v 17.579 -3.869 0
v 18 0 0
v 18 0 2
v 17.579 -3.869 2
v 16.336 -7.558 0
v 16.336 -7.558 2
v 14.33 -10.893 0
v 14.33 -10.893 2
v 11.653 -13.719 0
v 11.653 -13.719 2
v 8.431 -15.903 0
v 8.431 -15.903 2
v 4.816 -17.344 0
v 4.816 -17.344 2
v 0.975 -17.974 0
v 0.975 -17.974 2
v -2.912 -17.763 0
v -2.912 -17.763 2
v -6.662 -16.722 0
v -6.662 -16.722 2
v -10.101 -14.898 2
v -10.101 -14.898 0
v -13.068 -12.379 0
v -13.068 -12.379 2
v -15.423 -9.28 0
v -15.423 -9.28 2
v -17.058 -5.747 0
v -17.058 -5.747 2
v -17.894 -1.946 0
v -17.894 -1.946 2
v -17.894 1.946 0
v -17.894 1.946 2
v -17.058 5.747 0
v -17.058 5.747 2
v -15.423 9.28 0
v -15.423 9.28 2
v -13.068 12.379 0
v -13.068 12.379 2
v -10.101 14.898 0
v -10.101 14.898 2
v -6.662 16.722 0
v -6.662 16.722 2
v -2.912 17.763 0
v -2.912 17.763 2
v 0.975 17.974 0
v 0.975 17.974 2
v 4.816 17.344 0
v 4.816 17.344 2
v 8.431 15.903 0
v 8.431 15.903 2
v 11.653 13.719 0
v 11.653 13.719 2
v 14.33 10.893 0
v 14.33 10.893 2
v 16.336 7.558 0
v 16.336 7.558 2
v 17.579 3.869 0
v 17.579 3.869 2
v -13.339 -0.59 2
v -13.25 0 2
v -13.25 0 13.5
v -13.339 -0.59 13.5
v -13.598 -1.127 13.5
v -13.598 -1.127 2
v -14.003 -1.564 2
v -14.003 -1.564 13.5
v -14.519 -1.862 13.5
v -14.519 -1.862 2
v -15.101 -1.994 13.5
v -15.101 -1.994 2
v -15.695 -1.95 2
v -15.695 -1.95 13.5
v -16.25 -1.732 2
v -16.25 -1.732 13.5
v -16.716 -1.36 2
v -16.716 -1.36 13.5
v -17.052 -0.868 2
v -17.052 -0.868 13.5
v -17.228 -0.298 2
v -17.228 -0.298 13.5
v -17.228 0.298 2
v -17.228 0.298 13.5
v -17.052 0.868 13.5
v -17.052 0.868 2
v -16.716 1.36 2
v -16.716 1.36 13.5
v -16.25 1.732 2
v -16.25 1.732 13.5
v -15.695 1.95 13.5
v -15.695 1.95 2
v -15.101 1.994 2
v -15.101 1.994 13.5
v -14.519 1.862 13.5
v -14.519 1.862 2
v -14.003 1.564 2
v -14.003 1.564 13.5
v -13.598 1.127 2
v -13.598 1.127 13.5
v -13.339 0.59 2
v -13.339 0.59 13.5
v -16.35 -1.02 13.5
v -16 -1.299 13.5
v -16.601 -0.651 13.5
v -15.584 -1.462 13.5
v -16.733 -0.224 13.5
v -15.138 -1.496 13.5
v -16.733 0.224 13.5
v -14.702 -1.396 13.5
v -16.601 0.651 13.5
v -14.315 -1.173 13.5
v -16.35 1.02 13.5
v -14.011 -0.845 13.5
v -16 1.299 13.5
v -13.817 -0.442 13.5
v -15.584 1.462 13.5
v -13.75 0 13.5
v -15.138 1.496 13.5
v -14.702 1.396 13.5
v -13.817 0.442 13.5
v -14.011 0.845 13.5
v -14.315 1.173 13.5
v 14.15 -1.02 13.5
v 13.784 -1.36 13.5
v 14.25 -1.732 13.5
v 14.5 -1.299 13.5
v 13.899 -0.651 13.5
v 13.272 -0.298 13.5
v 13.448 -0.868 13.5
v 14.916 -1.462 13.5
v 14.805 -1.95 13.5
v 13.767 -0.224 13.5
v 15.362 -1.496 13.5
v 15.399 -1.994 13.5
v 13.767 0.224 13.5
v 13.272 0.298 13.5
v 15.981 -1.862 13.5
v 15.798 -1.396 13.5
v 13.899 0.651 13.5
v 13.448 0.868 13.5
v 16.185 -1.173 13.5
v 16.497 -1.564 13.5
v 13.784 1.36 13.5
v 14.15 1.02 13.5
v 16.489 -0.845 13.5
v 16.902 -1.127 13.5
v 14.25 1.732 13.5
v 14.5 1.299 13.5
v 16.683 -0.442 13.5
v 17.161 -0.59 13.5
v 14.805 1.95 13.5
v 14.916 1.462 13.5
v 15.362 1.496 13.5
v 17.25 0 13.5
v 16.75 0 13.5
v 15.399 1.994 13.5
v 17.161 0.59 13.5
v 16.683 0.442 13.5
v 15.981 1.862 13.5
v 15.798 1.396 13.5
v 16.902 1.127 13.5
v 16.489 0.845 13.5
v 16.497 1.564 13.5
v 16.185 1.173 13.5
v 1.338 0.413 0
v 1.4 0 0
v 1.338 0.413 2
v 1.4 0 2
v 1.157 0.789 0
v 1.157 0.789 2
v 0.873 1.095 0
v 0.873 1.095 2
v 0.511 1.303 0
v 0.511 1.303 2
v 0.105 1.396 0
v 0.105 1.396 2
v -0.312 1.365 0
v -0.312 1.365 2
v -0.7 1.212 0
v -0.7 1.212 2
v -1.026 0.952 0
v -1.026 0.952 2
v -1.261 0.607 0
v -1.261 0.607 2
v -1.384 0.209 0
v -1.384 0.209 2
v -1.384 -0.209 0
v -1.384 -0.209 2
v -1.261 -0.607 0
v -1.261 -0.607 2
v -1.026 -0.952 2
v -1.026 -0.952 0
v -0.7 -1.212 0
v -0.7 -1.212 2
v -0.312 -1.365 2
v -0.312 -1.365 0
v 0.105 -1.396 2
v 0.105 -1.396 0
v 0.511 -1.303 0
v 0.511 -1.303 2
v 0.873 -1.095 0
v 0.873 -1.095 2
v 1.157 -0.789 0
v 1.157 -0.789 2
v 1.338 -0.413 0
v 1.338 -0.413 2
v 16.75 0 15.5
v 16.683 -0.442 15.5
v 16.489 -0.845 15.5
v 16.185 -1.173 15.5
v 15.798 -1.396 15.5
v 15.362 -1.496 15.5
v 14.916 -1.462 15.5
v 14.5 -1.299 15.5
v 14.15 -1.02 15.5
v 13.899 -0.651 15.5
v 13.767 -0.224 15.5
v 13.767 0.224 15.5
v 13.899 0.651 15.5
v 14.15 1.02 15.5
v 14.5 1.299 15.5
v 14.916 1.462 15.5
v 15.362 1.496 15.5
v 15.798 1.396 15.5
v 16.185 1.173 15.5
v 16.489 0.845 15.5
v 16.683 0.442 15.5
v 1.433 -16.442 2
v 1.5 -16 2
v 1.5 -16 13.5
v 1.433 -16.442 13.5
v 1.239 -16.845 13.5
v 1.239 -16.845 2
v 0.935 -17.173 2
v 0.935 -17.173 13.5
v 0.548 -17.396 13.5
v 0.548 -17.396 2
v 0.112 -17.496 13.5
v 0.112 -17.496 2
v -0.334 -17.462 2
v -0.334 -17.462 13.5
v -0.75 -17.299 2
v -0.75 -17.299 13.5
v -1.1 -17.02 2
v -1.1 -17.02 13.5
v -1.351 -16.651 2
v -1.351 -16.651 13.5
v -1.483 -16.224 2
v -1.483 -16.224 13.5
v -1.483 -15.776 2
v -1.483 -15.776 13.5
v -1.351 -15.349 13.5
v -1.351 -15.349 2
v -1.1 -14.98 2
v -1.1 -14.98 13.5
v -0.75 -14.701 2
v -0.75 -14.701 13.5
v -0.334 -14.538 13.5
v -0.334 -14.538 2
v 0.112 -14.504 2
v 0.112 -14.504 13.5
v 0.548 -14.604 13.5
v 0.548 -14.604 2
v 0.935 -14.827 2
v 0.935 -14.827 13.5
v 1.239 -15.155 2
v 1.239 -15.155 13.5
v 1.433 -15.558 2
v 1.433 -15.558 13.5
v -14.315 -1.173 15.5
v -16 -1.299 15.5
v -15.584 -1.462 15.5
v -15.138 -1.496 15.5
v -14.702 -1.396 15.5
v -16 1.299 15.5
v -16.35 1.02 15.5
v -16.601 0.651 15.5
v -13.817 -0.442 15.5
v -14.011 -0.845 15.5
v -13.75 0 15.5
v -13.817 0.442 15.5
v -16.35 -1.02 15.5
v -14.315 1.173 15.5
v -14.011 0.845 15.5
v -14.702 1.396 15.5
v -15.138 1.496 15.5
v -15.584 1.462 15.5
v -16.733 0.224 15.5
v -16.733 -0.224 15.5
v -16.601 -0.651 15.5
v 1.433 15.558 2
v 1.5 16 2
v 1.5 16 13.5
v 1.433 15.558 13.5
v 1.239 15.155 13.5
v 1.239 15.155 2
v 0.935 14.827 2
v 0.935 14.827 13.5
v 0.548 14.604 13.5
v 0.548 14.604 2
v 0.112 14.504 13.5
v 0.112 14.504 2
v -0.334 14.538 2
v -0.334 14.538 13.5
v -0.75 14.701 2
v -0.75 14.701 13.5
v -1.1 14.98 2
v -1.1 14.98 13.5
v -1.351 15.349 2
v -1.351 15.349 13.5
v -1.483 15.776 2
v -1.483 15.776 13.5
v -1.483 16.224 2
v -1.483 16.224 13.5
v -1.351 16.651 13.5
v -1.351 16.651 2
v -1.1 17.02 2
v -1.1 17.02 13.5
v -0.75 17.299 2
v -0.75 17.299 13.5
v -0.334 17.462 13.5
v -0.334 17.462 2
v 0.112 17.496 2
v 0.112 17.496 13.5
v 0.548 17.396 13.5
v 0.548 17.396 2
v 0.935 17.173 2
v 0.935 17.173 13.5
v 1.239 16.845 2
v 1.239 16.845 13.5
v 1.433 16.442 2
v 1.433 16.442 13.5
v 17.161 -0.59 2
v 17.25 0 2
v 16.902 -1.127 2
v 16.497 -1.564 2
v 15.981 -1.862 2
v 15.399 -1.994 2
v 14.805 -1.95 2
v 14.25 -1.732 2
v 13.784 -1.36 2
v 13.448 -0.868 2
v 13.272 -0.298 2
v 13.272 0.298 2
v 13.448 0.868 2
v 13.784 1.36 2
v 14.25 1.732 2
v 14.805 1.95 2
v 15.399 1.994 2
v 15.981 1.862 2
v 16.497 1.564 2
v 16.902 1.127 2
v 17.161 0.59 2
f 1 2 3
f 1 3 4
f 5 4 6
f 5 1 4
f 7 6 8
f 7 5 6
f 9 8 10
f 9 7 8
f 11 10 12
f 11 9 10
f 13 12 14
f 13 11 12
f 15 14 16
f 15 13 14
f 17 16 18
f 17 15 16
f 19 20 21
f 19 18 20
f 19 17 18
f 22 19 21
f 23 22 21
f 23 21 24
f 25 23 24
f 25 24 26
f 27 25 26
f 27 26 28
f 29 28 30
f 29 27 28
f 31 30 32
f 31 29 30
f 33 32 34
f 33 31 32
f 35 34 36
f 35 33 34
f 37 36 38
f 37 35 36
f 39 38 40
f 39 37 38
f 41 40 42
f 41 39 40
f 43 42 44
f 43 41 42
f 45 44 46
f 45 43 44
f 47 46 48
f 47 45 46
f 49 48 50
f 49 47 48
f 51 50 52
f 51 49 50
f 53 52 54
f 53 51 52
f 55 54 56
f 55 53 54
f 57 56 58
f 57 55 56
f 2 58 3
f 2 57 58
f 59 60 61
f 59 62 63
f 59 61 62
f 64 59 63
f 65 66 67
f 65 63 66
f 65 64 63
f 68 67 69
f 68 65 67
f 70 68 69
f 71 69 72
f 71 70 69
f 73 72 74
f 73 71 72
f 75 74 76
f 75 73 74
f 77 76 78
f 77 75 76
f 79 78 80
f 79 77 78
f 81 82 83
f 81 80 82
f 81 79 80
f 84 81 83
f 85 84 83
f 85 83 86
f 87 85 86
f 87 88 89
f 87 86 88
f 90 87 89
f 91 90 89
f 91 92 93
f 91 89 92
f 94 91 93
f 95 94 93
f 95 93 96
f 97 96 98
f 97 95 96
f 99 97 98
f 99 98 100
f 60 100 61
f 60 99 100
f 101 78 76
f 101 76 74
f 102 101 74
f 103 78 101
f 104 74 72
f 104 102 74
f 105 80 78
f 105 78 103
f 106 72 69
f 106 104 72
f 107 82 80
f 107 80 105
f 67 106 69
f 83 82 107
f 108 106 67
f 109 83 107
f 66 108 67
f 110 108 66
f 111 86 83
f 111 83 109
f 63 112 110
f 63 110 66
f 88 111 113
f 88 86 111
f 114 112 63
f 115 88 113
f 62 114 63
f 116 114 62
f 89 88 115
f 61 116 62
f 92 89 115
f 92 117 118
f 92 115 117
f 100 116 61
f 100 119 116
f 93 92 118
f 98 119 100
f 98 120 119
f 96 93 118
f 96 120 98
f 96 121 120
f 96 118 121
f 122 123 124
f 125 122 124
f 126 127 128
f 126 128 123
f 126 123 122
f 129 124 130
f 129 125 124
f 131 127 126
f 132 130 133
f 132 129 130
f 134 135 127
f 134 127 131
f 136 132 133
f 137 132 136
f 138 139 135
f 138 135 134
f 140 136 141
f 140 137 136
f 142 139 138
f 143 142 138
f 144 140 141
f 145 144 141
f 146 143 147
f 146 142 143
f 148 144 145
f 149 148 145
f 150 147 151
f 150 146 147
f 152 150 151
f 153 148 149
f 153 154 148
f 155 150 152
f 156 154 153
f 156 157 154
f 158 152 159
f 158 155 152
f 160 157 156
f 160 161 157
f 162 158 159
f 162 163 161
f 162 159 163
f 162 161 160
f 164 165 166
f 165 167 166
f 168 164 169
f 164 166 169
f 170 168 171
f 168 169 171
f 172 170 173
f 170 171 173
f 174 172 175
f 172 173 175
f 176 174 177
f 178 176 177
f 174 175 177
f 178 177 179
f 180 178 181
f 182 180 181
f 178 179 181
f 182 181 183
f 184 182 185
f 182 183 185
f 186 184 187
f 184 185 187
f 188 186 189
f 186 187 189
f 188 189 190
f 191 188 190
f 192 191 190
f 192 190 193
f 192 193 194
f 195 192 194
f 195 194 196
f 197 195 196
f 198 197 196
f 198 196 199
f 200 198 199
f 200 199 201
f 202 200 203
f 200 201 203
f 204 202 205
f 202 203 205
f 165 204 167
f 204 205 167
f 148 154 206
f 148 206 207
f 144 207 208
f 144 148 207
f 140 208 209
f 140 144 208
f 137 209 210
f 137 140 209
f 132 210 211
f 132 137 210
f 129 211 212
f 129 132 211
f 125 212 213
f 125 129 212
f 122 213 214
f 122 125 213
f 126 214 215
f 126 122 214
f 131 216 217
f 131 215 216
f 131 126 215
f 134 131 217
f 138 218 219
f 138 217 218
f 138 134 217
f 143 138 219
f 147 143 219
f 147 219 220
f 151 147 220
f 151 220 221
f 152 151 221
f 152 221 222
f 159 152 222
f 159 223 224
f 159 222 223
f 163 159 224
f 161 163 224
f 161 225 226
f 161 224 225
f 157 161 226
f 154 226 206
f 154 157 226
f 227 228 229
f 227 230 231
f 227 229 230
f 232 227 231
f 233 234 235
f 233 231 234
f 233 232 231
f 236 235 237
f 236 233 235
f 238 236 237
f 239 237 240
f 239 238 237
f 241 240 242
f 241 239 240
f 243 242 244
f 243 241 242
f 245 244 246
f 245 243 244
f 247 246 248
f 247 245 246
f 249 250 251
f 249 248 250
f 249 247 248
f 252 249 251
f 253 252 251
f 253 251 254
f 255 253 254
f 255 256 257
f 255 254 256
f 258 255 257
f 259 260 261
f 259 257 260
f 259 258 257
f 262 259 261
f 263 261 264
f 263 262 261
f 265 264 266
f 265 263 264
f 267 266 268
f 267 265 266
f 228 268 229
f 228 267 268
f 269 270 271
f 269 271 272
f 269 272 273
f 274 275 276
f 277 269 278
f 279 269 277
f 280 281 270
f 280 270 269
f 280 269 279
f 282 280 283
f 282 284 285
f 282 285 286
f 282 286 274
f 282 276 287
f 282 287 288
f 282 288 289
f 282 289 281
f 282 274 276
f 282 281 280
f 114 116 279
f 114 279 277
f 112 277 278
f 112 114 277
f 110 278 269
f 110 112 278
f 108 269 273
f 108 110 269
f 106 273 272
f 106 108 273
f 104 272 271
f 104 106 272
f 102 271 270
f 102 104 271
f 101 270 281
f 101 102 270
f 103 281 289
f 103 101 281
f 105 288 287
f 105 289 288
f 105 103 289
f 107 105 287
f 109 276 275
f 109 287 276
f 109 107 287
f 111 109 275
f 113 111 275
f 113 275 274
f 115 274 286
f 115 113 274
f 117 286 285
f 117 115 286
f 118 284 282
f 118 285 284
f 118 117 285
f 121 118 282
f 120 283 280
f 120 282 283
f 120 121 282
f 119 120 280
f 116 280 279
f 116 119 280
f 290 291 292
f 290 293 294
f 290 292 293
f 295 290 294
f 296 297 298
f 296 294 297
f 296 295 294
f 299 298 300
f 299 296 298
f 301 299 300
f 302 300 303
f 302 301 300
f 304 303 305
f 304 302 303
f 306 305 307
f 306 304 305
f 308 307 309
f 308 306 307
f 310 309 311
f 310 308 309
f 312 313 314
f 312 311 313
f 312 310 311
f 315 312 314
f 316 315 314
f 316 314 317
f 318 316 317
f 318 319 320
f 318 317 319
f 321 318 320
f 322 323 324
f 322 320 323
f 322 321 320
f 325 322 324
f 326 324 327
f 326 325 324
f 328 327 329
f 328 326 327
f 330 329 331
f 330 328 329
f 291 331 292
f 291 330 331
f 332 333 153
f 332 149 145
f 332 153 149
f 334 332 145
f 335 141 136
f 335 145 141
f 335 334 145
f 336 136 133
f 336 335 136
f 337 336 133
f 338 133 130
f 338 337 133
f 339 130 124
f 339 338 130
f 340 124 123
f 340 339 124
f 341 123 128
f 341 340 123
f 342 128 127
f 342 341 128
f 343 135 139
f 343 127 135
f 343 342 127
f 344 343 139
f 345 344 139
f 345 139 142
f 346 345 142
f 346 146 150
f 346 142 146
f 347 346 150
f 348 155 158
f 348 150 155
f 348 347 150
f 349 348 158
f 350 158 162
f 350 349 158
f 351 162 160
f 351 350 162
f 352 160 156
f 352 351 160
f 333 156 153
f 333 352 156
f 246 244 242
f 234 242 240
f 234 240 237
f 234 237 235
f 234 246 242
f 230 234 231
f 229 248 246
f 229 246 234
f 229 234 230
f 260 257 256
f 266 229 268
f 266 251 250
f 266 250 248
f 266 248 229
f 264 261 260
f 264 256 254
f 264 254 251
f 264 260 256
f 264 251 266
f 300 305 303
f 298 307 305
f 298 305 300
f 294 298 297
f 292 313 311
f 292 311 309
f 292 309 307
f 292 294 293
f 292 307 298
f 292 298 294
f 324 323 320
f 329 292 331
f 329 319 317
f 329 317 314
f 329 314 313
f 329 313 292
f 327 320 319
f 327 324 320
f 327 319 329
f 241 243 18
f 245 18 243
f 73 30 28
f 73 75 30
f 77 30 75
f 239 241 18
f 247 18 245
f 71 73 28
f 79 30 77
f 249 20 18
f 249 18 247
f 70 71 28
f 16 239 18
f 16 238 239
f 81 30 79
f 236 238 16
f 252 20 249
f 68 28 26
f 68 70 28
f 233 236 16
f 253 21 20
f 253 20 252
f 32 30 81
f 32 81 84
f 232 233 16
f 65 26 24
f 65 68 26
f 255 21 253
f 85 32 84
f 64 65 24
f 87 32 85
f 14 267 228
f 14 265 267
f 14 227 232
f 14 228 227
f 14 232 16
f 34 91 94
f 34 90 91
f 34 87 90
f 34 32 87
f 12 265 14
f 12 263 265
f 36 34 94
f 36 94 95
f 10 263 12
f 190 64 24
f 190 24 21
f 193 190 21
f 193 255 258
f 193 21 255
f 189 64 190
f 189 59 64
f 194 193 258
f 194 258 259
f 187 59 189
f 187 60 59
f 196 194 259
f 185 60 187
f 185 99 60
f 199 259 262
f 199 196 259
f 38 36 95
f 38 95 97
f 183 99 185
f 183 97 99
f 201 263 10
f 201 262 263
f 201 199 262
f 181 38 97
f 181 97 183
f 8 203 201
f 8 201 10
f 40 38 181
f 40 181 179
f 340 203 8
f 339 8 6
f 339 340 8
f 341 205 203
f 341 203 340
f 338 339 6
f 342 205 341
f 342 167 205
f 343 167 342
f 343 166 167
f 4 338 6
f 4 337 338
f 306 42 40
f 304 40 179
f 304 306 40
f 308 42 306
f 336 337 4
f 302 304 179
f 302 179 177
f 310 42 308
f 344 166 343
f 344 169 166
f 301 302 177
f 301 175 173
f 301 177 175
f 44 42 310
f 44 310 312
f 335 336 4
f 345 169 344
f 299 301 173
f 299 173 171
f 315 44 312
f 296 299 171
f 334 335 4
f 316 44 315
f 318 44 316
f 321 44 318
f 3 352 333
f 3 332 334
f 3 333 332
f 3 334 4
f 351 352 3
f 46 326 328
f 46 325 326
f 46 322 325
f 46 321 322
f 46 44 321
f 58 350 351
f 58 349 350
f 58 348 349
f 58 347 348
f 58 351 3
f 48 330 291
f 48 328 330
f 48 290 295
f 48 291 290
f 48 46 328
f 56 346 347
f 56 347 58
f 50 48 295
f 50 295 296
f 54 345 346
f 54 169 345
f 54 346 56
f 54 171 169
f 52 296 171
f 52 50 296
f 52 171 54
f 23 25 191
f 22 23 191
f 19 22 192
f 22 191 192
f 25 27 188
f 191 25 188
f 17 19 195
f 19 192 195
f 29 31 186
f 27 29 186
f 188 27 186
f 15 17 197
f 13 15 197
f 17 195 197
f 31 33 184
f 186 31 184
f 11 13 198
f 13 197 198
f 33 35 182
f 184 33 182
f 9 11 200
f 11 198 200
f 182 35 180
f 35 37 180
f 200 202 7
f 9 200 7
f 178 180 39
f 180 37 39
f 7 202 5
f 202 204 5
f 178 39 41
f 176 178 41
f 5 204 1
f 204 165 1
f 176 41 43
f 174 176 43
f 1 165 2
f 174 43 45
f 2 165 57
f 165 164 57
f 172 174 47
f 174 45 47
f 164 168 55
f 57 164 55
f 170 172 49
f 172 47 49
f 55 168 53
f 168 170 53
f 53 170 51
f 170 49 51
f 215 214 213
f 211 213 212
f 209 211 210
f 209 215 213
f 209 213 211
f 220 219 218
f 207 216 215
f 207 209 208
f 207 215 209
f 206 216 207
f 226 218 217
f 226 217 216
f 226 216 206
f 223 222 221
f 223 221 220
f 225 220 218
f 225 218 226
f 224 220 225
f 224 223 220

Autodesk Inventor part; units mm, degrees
ref_plane "YZ Plane" through (0, 0, 0) normal (1, 0, 0) x (0, 1, 0)
ref_plane "XZ Plane" through (0, 0, 0) normal (0, 1, 0) x (-1, 0, 0)
ref_plane "XY Plane" through (0, 0, 0) normal (0, 0, 1) x (1, 0, 0)
sketch "スケッチ1" plane through (0, 0, 0) normal (0, 0, 1) x (1, 0, 0)
  circle A0 centre (0, 0) radius 18
  dimension "d0" = 36
extrude "押し出し1" add sketch "スケッチ1" along normal blind 2
sketch "スケッチ2" plane through (0, 0, 2) normal (0, 0, 1) x (1, 0, 0)
  circle A0 centre (-15.25, 0) radius 2
  circle A1 centre (15.25, 0) radius 2
  point P0 (0, 0)
  dimension "d3" = 4
  dimension "d4" = 4
  dimension "d5" = 0
  dimension "d6" = 0
  dimension "d8" = 15.25
  dimension "d9" = 30.5
extrude "押し出し2" add sketch "スケッチ2" along normal blind 11.5
sketch "スケッチ3" plane through (-15.25, 0, 13.5) normal (0, 0, 1) x (1, 0, 0)
  circle A0 centre (0, 0) radius 1.5
  circle A1 centre (30.5, 0) radius 1.5
  circle A2 centre (0, 0) radius 2 projected
  point P0 (15.25, 0)
  dimension "d12" = 3
  dimension "d13" = 3
  dimension "d14" = 30.5
  dimension "d15" = 0
extrude "押し出し3" add sketch "スケッチ3" along normal blind 2 contours A0 | A1
sketch "スケッチ4" plane through (0, 0, 2) normal (0, 0, 1) x (1, 0, 0)
  circle A0 centre (0, 16) radius 1.5
  circle A1 centre (0, -16) radius 1.5
  point P0 (0, 0)
  dimension "d18" = 3
  dimension "d19" = 3
  dimension "d20" = 32
  dimension "d21" = 16
extrude "押し出し4" add sketch "スケッチ4" along normal blind 11.5
sketch "スケッチ5" plane through (0, 0, 2) normal (0, 0, 1) x (1, 0, 0)
  circle A0 centre (0, 0) radius 1.4
  dimension "d24" = 2.8
extrude "押し出し5" cut sketch "スケッチ5" against normal blind 3
equation "\"BendRadius\" = Thickness"
equation "\"BendReliefWidth\" = Thickness"
equation "\"BendReliefDepth\" = 0.5 * Thickness"
equation "\"CornerReliefSize\" = 4 * Thickness"
equation "\"MinimumRemnant\" = 2 * Thickness"
equation "\"TransitionRadius\" = BendRadius"
equation "\"JacobiRadiusSize\" = BendRadius"
equation "\"GapSize\" = Thickness"
equation "\"Thickness\" = 0.5"
properties part number "1005"
